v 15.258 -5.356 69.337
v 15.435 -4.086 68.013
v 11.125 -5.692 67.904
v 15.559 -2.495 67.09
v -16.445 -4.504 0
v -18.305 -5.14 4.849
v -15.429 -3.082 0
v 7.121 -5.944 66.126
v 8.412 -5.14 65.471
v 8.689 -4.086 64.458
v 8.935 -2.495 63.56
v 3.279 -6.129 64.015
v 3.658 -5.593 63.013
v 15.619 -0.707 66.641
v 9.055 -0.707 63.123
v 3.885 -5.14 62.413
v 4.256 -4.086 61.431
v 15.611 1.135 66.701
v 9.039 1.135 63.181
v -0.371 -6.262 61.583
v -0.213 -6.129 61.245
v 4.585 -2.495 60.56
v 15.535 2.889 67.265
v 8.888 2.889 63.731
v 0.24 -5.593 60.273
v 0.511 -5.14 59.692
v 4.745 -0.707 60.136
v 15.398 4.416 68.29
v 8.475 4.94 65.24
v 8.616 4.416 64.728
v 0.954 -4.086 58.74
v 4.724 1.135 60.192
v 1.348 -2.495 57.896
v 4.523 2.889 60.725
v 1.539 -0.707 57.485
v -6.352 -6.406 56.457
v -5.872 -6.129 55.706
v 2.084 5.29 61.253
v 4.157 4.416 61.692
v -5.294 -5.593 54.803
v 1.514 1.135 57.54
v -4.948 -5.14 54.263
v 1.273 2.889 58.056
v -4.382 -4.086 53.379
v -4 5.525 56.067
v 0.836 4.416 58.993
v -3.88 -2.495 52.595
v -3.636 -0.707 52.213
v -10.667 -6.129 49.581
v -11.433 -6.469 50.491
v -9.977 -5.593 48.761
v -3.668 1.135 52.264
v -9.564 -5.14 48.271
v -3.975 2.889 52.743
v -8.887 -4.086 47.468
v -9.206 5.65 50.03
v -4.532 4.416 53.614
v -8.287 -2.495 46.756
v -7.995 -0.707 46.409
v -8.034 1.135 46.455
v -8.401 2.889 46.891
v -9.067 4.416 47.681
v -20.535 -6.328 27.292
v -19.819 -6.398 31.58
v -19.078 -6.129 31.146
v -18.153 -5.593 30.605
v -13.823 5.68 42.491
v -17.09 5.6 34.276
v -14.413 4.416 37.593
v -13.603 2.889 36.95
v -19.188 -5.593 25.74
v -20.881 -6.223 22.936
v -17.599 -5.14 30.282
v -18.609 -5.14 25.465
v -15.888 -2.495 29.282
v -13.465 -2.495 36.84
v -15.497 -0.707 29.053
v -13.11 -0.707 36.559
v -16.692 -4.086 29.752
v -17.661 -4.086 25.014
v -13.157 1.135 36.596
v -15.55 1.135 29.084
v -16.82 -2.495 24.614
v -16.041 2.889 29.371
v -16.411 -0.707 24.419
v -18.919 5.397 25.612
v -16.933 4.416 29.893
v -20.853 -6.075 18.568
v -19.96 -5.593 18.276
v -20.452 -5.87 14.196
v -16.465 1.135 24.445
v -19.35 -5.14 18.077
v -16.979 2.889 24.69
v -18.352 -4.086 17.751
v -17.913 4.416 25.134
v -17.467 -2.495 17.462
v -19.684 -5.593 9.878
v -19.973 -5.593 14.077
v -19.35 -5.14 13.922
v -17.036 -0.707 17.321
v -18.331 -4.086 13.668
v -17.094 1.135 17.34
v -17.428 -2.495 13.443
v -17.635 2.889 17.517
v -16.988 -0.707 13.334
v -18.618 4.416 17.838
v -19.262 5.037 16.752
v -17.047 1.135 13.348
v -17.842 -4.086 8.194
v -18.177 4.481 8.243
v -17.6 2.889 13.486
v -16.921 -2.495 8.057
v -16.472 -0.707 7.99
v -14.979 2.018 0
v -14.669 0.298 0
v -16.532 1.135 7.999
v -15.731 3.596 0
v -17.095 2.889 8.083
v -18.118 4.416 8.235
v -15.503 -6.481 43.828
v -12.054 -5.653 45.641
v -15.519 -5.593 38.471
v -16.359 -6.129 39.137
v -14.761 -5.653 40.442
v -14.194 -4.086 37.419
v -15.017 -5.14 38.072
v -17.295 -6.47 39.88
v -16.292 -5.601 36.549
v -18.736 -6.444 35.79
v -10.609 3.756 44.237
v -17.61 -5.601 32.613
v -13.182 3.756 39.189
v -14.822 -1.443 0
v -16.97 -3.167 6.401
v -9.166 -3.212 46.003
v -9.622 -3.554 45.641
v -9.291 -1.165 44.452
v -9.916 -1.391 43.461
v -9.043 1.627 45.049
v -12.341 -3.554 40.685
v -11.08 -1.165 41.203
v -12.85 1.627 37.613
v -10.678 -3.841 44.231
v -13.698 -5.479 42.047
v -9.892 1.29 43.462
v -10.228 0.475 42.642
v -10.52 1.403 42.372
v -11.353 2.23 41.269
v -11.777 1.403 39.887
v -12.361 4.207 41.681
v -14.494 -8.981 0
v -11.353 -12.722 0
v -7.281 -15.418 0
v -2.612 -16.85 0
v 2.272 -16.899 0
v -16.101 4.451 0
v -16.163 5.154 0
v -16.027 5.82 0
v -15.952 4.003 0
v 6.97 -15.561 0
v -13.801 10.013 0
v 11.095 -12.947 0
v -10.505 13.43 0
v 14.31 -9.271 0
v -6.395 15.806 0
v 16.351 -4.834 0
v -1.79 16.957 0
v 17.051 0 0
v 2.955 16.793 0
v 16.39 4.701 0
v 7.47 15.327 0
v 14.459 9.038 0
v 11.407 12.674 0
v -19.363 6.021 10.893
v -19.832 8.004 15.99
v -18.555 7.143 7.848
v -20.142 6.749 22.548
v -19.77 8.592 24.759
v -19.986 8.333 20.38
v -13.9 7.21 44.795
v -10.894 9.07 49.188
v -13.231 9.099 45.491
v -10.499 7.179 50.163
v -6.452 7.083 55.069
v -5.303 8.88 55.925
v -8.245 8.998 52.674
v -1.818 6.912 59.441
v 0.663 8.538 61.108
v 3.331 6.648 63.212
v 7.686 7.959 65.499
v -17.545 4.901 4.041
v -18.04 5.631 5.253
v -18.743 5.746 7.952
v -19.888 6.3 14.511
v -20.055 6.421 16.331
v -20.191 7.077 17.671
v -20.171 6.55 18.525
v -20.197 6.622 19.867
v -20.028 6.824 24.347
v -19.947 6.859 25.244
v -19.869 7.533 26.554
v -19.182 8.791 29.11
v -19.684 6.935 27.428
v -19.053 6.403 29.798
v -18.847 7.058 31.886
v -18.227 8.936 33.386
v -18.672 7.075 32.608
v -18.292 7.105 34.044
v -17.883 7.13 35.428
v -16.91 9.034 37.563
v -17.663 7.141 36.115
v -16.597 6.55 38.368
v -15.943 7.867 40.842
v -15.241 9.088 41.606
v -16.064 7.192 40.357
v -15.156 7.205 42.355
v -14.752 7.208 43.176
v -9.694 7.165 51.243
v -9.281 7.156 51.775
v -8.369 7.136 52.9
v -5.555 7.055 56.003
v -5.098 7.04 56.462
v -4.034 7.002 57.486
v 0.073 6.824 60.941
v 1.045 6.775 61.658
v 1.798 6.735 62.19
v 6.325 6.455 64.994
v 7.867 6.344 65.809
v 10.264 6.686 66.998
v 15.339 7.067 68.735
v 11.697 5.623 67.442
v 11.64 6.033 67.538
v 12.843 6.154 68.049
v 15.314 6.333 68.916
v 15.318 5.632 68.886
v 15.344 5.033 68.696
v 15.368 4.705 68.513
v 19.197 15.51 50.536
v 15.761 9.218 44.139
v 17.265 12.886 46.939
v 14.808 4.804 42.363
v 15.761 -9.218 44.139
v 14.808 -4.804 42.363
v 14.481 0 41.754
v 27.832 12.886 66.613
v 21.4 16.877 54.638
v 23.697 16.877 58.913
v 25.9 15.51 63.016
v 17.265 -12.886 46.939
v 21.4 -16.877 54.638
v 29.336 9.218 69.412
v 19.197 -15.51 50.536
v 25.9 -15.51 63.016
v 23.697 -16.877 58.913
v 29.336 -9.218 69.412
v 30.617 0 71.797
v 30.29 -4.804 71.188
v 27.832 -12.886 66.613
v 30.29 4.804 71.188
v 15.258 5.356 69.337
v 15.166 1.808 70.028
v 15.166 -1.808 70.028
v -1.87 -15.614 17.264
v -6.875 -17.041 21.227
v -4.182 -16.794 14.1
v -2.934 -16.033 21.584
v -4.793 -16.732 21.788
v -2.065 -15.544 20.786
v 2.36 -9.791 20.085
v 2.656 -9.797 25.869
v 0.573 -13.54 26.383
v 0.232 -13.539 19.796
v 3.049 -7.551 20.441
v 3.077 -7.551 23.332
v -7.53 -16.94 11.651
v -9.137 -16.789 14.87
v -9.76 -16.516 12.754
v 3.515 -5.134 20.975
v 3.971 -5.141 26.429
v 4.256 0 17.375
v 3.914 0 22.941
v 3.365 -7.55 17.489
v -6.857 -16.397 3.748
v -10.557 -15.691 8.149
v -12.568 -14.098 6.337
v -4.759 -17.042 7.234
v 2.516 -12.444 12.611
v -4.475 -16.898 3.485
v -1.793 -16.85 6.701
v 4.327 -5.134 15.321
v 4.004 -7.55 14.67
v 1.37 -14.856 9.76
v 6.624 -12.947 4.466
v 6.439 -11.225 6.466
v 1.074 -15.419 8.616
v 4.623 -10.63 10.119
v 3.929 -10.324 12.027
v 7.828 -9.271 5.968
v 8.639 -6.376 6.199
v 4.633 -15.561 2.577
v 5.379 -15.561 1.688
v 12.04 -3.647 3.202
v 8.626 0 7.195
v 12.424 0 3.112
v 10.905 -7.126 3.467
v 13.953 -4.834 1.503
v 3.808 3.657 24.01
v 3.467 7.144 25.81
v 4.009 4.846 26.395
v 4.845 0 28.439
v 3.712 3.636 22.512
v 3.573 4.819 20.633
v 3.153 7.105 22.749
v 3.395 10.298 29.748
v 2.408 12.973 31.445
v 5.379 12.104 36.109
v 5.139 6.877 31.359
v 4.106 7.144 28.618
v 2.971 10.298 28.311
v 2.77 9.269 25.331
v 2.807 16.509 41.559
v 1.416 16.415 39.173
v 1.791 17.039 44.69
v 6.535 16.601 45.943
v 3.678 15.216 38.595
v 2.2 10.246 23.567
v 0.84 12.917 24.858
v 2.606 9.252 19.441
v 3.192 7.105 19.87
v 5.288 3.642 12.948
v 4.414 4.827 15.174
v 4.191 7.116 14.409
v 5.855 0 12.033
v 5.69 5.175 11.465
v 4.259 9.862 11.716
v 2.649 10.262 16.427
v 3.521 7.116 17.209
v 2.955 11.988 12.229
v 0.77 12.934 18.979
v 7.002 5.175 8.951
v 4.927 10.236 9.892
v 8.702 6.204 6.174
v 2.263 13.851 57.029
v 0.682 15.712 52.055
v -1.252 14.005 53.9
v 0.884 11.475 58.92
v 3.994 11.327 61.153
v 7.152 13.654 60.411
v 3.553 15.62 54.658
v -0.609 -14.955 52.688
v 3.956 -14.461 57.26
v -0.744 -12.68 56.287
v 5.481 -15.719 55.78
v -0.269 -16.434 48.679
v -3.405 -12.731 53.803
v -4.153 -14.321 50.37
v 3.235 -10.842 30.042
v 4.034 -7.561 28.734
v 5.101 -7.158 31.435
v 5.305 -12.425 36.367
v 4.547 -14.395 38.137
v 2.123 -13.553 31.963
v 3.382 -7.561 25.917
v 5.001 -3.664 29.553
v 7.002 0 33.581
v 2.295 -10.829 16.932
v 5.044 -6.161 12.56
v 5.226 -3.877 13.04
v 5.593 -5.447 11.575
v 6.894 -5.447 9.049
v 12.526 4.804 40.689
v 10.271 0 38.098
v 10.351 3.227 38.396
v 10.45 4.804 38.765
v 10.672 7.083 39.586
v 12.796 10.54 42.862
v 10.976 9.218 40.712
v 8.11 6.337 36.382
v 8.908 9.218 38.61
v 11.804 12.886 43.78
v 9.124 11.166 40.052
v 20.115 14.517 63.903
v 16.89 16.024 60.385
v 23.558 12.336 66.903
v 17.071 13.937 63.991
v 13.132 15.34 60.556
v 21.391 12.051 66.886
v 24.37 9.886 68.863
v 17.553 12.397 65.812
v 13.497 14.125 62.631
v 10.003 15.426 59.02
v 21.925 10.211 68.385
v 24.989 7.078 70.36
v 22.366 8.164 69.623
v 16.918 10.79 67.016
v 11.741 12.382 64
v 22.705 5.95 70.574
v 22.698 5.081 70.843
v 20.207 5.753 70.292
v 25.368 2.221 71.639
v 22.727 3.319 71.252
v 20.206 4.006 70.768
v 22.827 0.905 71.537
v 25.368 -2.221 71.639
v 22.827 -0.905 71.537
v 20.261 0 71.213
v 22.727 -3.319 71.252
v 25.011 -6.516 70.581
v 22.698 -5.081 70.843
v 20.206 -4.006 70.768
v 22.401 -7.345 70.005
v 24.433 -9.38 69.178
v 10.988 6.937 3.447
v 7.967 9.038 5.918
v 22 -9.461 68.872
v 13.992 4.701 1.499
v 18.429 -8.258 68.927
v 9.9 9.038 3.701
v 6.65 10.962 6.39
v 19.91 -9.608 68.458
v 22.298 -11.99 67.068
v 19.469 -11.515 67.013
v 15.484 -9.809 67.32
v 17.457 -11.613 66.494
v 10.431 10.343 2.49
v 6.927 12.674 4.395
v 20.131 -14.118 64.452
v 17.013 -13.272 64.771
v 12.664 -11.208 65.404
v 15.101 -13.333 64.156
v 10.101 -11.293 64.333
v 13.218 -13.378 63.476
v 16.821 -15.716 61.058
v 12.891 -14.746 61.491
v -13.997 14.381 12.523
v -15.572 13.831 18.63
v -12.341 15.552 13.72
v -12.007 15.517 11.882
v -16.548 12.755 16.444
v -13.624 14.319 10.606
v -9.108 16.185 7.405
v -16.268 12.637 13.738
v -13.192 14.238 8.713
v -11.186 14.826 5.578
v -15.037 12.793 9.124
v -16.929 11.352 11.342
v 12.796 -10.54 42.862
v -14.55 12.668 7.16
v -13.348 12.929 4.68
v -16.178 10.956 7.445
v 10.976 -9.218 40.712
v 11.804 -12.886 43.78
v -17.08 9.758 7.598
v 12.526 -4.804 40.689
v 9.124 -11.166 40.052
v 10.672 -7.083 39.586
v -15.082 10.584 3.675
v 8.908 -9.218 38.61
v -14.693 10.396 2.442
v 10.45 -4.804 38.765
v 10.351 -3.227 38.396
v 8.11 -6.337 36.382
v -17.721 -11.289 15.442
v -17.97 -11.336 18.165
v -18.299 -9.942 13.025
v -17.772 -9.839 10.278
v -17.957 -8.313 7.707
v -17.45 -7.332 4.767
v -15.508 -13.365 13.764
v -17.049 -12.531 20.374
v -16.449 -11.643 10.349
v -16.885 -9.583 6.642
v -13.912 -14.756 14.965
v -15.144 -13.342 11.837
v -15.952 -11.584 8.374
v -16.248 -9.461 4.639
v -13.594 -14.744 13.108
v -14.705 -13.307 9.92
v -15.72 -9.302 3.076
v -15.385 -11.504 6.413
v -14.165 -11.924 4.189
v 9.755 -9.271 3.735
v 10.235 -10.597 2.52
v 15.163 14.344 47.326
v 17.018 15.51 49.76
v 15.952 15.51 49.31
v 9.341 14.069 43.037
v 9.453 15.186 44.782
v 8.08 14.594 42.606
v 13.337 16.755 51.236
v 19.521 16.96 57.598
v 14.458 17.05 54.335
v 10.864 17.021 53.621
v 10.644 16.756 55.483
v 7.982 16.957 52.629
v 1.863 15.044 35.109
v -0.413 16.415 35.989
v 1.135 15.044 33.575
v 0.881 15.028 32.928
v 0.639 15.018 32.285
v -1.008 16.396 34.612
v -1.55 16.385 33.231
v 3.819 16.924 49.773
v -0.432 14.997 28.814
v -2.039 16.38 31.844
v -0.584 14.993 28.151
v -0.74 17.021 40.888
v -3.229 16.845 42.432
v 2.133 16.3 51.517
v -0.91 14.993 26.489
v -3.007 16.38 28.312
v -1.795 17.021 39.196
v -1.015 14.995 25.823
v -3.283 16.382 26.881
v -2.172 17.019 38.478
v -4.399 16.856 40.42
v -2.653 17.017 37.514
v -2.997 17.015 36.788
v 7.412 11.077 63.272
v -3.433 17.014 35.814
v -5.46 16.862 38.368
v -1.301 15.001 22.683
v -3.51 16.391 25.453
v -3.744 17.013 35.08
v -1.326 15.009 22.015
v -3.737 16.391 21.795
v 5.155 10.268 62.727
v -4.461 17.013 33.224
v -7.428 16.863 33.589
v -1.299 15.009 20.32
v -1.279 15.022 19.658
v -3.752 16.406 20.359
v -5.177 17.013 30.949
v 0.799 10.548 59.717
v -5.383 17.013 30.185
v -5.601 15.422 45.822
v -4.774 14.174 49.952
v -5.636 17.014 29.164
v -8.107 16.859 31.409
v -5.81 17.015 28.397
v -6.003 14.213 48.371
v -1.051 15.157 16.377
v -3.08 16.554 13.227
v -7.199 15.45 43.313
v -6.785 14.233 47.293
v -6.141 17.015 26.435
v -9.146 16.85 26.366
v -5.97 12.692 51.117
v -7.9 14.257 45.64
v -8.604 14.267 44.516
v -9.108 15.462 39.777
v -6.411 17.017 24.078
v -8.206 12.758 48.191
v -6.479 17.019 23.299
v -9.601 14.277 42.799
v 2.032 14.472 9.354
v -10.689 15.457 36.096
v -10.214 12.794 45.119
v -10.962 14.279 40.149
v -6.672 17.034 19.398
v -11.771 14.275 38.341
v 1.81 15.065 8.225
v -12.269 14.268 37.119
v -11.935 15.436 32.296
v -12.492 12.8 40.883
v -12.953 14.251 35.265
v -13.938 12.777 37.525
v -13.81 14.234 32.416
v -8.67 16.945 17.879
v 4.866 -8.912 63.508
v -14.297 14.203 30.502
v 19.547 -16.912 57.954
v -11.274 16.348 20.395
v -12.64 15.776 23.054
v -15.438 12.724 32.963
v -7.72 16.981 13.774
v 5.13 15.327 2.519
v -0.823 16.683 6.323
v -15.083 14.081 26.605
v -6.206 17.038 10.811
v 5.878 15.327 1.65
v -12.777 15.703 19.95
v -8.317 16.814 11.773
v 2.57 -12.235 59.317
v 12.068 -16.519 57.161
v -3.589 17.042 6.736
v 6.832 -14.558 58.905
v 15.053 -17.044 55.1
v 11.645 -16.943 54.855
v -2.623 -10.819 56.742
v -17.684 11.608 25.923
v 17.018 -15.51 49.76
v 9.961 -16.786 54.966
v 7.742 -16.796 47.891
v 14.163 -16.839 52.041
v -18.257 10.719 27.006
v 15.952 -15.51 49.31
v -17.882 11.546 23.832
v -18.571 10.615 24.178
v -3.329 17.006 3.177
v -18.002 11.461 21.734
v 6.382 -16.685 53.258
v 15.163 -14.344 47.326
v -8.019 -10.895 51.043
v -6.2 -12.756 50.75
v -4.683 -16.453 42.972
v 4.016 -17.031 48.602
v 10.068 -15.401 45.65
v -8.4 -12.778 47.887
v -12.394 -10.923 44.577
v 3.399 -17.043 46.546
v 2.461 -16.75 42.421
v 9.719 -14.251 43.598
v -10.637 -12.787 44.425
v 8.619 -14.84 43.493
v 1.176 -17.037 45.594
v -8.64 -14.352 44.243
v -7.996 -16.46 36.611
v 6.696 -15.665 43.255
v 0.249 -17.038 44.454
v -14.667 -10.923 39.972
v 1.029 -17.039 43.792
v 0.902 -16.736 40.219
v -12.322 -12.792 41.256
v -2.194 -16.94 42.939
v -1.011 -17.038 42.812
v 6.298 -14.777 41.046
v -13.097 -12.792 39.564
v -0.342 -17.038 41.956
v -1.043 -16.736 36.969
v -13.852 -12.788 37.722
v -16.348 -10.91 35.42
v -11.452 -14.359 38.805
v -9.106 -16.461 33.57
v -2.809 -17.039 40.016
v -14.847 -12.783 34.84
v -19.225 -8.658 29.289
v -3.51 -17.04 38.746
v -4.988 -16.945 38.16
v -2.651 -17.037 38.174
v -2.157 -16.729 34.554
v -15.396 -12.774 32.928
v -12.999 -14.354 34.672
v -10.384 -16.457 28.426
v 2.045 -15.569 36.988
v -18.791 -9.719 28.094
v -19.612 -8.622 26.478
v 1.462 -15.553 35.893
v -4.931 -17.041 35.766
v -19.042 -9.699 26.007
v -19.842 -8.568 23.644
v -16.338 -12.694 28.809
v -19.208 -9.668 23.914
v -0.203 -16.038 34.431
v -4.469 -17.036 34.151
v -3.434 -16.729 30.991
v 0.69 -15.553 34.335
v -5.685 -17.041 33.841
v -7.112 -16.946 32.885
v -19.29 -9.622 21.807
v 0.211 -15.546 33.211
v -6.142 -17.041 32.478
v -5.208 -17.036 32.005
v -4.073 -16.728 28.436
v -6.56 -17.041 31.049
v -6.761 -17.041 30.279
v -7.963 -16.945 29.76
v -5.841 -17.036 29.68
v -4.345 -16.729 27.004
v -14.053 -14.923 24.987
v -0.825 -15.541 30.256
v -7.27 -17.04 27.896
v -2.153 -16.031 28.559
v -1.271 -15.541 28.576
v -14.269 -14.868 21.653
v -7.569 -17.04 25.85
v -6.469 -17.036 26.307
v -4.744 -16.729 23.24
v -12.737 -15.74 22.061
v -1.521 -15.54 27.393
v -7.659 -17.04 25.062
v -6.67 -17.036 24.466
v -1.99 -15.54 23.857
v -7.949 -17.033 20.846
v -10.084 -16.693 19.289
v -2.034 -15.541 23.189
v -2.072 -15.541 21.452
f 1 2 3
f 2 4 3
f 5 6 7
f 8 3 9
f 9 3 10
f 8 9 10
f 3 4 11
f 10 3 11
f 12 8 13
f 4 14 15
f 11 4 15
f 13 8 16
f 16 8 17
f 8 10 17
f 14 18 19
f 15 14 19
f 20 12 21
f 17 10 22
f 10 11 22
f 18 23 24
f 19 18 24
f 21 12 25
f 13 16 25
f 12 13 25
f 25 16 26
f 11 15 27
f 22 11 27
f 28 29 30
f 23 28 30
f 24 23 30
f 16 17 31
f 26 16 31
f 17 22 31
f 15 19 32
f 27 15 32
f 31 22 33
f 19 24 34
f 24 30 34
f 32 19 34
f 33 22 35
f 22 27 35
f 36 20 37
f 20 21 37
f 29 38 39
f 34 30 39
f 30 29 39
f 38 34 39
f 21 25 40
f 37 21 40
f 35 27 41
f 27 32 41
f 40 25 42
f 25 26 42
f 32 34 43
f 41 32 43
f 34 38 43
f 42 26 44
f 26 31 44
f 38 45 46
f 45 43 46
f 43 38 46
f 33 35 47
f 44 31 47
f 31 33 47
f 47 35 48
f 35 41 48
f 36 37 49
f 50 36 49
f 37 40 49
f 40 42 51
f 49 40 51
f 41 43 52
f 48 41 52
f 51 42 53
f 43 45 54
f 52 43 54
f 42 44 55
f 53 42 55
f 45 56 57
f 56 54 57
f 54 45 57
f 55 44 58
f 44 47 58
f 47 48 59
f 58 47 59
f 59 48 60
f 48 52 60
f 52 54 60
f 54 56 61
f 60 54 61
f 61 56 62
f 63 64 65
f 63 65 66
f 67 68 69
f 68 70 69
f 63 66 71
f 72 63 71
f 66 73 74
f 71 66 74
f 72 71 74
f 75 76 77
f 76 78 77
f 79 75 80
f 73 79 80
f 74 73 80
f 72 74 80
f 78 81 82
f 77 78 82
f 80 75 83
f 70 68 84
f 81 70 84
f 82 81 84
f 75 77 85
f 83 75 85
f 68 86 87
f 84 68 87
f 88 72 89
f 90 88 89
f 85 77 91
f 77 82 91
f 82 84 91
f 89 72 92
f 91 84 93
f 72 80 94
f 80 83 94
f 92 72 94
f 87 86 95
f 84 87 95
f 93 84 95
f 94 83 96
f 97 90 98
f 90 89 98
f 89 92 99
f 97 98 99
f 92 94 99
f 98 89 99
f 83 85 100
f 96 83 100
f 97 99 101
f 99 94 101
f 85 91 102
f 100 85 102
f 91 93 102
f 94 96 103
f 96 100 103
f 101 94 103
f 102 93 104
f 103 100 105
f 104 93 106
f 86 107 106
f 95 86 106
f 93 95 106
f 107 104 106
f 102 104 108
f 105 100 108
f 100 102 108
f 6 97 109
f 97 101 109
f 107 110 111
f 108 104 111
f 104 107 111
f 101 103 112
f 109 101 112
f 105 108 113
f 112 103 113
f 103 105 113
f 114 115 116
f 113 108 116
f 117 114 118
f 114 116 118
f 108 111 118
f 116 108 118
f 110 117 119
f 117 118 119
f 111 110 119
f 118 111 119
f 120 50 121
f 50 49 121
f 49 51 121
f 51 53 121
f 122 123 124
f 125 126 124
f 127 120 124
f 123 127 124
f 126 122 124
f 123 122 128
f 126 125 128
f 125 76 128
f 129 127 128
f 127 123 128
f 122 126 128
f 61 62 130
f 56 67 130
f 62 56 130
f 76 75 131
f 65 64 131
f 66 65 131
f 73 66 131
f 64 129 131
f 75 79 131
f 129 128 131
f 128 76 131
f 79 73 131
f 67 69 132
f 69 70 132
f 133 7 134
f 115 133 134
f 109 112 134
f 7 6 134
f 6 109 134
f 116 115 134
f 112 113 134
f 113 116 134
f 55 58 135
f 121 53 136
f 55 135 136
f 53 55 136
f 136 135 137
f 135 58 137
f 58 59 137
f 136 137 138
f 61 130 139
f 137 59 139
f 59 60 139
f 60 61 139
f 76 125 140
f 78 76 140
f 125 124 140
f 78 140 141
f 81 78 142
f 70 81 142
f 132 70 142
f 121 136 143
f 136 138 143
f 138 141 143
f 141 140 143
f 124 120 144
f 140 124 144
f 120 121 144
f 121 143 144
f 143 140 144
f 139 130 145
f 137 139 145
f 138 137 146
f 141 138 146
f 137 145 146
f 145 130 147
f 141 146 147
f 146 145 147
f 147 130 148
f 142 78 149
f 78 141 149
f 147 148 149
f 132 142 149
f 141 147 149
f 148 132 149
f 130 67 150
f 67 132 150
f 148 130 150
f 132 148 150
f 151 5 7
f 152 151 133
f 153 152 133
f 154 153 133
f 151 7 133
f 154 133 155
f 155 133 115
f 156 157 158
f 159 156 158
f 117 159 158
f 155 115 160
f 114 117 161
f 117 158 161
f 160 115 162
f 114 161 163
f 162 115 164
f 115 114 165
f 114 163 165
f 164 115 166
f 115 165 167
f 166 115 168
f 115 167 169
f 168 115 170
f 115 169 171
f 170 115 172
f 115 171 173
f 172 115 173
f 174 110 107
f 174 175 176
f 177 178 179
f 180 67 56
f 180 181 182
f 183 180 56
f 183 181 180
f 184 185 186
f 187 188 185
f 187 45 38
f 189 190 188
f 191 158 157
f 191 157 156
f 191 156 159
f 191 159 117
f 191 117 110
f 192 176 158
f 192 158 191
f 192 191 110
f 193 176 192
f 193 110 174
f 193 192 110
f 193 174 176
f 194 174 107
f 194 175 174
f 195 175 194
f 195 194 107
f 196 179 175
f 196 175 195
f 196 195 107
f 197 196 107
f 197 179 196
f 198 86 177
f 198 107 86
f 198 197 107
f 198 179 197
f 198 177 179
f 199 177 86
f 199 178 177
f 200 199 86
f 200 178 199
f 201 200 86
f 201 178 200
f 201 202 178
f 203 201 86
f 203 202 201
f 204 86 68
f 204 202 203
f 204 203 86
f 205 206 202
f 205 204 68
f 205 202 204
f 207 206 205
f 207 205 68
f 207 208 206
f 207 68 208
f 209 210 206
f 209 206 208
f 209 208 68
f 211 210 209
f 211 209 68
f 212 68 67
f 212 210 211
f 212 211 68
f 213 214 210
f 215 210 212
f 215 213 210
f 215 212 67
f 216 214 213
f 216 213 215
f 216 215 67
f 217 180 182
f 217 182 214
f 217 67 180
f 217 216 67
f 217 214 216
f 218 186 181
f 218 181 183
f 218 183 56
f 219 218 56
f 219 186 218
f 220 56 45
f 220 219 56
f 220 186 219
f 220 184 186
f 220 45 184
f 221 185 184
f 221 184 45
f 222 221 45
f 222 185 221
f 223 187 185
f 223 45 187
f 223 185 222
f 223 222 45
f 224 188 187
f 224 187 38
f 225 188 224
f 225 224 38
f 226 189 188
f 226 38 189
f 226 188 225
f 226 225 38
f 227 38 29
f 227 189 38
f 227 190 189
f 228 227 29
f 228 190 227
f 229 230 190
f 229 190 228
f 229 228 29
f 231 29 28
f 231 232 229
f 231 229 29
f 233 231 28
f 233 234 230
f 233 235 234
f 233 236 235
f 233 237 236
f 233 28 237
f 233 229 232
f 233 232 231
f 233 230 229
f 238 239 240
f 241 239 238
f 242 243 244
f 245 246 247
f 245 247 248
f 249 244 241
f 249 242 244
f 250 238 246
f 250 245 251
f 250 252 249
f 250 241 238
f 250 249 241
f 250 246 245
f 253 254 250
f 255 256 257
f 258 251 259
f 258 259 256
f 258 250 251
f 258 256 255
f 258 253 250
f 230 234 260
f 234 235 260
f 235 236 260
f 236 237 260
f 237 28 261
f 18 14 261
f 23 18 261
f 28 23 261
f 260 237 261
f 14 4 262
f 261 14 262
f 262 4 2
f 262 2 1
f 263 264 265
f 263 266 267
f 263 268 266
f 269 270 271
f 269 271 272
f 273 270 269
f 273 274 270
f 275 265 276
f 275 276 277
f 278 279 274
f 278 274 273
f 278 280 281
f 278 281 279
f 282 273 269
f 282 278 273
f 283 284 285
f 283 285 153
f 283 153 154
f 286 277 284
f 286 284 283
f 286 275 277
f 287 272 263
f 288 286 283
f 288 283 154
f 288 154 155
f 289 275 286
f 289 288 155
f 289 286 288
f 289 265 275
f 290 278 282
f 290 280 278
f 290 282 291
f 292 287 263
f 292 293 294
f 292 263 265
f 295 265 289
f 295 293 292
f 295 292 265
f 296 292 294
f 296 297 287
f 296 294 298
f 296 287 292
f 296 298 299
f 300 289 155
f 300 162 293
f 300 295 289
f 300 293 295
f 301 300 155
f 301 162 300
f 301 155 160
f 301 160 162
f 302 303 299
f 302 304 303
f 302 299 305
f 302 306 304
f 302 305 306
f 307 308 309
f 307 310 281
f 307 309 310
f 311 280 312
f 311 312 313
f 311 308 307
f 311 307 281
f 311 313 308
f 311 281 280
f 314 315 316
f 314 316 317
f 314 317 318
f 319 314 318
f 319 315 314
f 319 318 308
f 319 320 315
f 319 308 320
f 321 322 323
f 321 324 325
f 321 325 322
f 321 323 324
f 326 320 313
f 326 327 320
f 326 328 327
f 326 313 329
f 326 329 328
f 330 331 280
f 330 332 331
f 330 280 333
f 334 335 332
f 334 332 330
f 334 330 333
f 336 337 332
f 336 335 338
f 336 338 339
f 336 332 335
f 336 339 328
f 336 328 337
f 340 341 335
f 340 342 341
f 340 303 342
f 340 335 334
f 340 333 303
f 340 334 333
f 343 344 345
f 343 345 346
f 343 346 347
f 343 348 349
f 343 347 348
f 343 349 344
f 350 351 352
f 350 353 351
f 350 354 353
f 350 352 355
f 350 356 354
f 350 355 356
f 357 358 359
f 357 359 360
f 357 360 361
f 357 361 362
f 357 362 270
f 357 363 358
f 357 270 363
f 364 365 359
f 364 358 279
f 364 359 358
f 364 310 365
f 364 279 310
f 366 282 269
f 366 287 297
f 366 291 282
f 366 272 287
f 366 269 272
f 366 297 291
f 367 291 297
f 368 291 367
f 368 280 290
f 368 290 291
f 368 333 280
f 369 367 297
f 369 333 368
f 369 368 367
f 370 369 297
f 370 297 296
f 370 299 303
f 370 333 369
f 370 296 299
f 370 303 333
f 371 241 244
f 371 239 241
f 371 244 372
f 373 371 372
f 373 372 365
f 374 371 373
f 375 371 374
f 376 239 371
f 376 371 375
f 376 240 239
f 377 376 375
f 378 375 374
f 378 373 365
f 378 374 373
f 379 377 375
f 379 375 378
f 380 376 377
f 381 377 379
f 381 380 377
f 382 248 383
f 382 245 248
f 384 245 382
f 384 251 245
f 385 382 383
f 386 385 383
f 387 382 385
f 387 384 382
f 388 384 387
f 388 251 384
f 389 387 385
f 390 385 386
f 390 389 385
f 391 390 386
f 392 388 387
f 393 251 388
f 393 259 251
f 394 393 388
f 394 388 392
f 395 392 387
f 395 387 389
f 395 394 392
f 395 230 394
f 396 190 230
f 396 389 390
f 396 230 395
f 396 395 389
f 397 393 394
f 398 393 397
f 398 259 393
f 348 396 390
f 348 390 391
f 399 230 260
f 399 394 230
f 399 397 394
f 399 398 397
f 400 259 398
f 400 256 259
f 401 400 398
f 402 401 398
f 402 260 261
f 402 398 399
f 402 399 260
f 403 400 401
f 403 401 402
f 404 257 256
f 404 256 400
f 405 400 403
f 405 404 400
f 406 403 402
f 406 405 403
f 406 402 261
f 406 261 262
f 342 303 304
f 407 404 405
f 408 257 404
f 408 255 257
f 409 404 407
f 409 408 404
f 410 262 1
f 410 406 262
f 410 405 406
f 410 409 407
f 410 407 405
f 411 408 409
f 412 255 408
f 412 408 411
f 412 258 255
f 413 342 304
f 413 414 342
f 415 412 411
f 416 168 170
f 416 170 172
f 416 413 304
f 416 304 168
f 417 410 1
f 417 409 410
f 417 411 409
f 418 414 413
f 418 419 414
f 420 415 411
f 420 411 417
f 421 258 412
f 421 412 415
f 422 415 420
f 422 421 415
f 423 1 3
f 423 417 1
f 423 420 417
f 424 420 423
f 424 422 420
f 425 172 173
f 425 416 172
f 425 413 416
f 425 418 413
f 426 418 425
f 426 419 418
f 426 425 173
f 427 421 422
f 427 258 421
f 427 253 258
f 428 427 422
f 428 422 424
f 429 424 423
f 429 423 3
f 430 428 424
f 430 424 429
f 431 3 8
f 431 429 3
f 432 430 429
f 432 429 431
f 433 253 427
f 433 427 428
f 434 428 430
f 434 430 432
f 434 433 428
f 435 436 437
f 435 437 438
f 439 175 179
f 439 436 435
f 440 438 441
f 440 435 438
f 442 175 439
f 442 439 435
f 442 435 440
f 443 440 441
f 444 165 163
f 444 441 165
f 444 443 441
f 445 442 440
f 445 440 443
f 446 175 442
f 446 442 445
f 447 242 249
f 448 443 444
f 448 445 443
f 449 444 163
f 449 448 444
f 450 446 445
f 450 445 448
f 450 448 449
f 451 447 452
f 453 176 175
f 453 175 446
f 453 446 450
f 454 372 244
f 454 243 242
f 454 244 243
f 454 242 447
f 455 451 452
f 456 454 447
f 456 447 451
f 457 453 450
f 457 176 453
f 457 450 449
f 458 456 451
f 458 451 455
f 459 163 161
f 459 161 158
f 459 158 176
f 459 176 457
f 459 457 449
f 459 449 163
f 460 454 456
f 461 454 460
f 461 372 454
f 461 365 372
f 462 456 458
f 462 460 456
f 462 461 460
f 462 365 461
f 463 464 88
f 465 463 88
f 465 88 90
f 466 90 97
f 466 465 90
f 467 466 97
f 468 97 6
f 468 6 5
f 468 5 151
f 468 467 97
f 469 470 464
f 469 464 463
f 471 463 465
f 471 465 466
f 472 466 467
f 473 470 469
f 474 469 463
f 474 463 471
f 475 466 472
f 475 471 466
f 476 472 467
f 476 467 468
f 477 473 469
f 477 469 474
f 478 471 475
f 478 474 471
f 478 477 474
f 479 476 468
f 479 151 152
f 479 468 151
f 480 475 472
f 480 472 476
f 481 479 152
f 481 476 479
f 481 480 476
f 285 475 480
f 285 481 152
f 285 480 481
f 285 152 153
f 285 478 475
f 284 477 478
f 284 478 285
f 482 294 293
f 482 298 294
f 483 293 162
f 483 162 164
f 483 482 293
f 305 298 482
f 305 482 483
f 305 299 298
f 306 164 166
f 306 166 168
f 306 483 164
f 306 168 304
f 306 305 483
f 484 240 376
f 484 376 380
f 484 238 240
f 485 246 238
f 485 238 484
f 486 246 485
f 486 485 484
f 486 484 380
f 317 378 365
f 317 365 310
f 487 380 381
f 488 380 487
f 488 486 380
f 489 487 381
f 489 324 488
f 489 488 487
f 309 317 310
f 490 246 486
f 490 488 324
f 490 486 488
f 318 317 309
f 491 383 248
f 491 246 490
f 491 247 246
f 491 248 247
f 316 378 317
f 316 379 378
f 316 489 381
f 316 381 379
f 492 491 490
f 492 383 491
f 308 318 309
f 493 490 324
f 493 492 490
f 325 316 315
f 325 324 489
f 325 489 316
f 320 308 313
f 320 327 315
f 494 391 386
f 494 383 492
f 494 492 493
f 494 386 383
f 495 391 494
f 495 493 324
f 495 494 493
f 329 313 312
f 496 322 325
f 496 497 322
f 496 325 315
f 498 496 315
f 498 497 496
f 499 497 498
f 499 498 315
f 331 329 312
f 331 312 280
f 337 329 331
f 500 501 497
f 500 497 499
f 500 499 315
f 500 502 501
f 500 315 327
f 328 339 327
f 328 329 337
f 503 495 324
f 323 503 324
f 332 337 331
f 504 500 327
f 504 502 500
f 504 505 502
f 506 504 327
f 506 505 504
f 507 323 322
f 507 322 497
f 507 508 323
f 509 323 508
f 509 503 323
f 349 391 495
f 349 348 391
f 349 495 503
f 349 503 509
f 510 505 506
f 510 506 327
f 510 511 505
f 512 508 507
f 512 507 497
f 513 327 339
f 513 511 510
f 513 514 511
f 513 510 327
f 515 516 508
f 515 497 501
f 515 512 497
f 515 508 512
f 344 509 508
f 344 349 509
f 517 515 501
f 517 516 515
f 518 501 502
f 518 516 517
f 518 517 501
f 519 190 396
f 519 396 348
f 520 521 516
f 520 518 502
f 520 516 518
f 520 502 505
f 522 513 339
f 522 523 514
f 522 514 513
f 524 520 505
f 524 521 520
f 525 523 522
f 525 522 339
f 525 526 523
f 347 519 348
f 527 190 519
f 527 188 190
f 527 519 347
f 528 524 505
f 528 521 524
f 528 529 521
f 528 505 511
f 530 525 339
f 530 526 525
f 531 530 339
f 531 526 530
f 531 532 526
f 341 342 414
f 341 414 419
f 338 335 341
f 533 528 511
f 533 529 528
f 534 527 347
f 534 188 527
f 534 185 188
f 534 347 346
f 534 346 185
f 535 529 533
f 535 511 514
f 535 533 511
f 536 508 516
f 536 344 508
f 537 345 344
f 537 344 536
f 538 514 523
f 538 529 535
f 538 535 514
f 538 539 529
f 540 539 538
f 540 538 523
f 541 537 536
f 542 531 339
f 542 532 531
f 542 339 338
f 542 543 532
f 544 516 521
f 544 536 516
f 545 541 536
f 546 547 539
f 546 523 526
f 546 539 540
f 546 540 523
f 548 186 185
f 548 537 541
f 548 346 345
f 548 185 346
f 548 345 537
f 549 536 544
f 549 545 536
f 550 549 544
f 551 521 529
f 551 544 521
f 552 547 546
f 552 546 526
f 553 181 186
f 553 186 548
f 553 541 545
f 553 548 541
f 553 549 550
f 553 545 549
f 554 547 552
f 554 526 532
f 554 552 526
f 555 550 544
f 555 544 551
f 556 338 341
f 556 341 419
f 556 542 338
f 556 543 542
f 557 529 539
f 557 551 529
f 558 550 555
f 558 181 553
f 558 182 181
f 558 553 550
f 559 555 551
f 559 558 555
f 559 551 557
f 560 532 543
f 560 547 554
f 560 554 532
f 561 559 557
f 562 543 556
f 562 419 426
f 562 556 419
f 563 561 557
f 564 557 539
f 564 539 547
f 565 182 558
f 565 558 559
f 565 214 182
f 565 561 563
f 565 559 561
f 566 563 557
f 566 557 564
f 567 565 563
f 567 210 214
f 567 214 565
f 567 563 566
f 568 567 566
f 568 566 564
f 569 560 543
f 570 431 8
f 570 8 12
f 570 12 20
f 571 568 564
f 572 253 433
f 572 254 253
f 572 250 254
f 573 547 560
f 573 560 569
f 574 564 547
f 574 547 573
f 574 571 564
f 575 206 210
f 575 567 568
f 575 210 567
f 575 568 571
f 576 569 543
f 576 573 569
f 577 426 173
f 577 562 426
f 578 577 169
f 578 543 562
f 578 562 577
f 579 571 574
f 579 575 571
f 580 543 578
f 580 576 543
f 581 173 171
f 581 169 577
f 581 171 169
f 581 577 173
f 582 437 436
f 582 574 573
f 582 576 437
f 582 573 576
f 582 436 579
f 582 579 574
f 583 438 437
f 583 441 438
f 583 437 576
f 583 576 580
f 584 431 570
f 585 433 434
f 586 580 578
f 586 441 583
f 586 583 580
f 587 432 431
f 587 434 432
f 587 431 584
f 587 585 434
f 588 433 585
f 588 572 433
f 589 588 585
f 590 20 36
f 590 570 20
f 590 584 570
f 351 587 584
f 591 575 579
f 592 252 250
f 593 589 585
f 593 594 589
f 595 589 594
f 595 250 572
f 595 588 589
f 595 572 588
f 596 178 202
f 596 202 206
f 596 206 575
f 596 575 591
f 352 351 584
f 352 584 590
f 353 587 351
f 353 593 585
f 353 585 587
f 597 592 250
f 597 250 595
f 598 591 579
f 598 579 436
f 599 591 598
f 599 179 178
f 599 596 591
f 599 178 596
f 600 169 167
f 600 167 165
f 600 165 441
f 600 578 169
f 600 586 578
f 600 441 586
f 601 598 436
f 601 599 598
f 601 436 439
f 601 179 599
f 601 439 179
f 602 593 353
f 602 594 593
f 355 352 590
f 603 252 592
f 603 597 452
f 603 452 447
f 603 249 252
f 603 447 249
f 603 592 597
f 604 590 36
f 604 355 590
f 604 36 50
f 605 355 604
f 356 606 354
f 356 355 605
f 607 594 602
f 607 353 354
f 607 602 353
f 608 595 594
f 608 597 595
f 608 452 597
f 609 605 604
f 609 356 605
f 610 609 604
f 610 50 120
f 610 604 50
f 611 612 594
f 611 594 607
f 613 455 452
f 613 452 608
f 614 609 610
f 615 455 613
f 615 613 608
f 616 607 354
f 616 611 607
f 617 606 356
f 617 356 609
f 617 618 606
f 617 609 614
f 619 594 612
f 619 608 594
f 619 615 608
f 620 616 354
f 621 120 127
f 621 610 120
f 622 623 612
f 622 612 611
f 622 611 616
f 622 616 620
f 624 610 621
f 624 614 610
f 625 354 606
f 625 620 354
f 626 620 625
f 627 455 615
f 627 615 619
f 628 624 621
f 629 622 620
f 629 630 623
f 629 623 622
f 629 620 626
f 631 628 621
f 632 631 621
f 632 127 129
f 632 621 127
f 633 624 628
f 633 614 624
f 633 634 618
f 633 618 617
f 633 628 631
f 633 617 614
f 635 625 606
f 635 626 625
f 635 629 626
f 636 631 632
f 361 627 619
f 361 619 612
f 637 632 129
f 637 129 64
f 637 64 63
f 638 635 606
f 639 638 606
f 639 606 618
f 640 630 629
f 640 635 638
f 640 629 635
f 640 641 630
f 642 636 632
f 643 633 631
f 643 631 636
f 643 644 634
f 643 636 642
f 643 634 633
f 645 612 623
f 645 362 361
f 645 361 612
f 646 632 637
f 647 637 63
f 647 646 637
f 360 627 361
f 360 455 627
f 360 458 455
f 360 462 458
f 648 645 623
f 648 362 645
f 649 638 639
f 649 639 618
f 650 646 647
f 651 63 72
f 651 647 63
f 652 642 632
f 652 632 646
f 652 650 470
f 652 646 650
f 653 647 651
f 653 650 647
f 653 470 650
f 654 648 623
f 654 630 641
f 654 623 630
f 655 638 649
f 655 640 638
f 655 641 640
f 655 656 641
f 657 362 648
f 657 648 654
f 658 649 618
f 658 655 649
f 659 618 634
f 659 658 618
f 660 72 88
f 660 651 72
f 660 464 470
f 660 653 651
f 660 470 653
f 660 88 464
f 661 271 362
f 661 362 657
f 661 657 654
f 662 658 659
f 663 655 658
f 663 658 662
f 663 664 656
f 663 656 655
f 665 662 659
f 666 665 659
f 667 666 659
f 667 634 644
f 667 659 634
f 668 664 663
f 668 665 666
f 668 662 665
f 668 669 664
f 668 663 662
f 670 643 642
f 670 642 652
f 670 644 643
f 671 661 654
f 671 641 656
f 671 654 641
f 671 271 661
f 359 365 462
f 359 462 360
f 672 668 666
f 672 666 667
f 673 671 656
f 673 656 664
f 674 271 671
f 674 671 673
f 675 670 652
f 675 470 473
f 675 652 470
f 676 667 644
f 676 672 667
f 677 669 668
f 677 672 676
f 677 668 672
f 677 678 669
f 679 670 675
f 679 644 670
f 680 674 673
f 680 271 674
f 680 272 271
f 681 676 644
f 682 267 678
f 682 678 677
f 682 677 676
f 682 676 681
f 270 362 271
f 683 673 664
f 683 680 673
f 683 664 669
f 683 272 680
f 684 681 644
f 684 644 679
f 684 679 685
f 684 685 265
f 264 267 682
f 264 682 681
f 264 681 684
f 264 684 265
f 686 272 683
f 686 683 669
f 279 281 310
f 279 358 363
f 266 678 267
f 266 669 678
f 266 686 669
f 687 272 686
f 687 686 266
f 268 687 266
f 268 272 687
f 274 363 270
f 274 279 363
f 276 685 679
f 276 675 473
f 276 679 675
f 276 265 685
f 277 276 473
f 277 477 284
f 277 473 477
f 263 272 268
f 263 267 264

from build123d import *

# Parameters (mm, degrees)
F0_R = 17.0508344958
F3_R = 6.5798562112
F6_R = 2.54


with BuildPart() as f2:
    # F2: sweep along a path in F1
    with BuildLine(Plane.XZ) as f2_path:
        ThreePointArc((22.5486494601, 56.7756593227), (-4.8260451433, 34.7821472401), (0, 0))
    # F0 (on Top) → F2 (sweep)
    with BuildSketch(Plane.XY):
        Circle(F0_R)
    sweep(path=f2_path.line)

    # F5: sweep along a path in F4
    with BuildLine(Plane.XZ) as f5_path:
        ThreePointArc((14.7513579577, 73.1248388765), (-16.9846248554, 43.3251523108), (-21.2419833988, 0))
    # F3 (on Top) → F5 (sweep, cut)
    with BuildSketch(Plane.XY):
        with Locations((-21.2419833988, 0)):
            Circle(F3_R)
    sweep(path=f5_path.line, mode=Mode.SUBTRACT)

    # F6
    f6_edges = [f2.edges().sort_by_distance(p)[0] for p in [
        (-16.429502, 6.477089, 41.900907),
    ]]
    fillet(f6_edges, radius=F6_R)


solid = f2.part
